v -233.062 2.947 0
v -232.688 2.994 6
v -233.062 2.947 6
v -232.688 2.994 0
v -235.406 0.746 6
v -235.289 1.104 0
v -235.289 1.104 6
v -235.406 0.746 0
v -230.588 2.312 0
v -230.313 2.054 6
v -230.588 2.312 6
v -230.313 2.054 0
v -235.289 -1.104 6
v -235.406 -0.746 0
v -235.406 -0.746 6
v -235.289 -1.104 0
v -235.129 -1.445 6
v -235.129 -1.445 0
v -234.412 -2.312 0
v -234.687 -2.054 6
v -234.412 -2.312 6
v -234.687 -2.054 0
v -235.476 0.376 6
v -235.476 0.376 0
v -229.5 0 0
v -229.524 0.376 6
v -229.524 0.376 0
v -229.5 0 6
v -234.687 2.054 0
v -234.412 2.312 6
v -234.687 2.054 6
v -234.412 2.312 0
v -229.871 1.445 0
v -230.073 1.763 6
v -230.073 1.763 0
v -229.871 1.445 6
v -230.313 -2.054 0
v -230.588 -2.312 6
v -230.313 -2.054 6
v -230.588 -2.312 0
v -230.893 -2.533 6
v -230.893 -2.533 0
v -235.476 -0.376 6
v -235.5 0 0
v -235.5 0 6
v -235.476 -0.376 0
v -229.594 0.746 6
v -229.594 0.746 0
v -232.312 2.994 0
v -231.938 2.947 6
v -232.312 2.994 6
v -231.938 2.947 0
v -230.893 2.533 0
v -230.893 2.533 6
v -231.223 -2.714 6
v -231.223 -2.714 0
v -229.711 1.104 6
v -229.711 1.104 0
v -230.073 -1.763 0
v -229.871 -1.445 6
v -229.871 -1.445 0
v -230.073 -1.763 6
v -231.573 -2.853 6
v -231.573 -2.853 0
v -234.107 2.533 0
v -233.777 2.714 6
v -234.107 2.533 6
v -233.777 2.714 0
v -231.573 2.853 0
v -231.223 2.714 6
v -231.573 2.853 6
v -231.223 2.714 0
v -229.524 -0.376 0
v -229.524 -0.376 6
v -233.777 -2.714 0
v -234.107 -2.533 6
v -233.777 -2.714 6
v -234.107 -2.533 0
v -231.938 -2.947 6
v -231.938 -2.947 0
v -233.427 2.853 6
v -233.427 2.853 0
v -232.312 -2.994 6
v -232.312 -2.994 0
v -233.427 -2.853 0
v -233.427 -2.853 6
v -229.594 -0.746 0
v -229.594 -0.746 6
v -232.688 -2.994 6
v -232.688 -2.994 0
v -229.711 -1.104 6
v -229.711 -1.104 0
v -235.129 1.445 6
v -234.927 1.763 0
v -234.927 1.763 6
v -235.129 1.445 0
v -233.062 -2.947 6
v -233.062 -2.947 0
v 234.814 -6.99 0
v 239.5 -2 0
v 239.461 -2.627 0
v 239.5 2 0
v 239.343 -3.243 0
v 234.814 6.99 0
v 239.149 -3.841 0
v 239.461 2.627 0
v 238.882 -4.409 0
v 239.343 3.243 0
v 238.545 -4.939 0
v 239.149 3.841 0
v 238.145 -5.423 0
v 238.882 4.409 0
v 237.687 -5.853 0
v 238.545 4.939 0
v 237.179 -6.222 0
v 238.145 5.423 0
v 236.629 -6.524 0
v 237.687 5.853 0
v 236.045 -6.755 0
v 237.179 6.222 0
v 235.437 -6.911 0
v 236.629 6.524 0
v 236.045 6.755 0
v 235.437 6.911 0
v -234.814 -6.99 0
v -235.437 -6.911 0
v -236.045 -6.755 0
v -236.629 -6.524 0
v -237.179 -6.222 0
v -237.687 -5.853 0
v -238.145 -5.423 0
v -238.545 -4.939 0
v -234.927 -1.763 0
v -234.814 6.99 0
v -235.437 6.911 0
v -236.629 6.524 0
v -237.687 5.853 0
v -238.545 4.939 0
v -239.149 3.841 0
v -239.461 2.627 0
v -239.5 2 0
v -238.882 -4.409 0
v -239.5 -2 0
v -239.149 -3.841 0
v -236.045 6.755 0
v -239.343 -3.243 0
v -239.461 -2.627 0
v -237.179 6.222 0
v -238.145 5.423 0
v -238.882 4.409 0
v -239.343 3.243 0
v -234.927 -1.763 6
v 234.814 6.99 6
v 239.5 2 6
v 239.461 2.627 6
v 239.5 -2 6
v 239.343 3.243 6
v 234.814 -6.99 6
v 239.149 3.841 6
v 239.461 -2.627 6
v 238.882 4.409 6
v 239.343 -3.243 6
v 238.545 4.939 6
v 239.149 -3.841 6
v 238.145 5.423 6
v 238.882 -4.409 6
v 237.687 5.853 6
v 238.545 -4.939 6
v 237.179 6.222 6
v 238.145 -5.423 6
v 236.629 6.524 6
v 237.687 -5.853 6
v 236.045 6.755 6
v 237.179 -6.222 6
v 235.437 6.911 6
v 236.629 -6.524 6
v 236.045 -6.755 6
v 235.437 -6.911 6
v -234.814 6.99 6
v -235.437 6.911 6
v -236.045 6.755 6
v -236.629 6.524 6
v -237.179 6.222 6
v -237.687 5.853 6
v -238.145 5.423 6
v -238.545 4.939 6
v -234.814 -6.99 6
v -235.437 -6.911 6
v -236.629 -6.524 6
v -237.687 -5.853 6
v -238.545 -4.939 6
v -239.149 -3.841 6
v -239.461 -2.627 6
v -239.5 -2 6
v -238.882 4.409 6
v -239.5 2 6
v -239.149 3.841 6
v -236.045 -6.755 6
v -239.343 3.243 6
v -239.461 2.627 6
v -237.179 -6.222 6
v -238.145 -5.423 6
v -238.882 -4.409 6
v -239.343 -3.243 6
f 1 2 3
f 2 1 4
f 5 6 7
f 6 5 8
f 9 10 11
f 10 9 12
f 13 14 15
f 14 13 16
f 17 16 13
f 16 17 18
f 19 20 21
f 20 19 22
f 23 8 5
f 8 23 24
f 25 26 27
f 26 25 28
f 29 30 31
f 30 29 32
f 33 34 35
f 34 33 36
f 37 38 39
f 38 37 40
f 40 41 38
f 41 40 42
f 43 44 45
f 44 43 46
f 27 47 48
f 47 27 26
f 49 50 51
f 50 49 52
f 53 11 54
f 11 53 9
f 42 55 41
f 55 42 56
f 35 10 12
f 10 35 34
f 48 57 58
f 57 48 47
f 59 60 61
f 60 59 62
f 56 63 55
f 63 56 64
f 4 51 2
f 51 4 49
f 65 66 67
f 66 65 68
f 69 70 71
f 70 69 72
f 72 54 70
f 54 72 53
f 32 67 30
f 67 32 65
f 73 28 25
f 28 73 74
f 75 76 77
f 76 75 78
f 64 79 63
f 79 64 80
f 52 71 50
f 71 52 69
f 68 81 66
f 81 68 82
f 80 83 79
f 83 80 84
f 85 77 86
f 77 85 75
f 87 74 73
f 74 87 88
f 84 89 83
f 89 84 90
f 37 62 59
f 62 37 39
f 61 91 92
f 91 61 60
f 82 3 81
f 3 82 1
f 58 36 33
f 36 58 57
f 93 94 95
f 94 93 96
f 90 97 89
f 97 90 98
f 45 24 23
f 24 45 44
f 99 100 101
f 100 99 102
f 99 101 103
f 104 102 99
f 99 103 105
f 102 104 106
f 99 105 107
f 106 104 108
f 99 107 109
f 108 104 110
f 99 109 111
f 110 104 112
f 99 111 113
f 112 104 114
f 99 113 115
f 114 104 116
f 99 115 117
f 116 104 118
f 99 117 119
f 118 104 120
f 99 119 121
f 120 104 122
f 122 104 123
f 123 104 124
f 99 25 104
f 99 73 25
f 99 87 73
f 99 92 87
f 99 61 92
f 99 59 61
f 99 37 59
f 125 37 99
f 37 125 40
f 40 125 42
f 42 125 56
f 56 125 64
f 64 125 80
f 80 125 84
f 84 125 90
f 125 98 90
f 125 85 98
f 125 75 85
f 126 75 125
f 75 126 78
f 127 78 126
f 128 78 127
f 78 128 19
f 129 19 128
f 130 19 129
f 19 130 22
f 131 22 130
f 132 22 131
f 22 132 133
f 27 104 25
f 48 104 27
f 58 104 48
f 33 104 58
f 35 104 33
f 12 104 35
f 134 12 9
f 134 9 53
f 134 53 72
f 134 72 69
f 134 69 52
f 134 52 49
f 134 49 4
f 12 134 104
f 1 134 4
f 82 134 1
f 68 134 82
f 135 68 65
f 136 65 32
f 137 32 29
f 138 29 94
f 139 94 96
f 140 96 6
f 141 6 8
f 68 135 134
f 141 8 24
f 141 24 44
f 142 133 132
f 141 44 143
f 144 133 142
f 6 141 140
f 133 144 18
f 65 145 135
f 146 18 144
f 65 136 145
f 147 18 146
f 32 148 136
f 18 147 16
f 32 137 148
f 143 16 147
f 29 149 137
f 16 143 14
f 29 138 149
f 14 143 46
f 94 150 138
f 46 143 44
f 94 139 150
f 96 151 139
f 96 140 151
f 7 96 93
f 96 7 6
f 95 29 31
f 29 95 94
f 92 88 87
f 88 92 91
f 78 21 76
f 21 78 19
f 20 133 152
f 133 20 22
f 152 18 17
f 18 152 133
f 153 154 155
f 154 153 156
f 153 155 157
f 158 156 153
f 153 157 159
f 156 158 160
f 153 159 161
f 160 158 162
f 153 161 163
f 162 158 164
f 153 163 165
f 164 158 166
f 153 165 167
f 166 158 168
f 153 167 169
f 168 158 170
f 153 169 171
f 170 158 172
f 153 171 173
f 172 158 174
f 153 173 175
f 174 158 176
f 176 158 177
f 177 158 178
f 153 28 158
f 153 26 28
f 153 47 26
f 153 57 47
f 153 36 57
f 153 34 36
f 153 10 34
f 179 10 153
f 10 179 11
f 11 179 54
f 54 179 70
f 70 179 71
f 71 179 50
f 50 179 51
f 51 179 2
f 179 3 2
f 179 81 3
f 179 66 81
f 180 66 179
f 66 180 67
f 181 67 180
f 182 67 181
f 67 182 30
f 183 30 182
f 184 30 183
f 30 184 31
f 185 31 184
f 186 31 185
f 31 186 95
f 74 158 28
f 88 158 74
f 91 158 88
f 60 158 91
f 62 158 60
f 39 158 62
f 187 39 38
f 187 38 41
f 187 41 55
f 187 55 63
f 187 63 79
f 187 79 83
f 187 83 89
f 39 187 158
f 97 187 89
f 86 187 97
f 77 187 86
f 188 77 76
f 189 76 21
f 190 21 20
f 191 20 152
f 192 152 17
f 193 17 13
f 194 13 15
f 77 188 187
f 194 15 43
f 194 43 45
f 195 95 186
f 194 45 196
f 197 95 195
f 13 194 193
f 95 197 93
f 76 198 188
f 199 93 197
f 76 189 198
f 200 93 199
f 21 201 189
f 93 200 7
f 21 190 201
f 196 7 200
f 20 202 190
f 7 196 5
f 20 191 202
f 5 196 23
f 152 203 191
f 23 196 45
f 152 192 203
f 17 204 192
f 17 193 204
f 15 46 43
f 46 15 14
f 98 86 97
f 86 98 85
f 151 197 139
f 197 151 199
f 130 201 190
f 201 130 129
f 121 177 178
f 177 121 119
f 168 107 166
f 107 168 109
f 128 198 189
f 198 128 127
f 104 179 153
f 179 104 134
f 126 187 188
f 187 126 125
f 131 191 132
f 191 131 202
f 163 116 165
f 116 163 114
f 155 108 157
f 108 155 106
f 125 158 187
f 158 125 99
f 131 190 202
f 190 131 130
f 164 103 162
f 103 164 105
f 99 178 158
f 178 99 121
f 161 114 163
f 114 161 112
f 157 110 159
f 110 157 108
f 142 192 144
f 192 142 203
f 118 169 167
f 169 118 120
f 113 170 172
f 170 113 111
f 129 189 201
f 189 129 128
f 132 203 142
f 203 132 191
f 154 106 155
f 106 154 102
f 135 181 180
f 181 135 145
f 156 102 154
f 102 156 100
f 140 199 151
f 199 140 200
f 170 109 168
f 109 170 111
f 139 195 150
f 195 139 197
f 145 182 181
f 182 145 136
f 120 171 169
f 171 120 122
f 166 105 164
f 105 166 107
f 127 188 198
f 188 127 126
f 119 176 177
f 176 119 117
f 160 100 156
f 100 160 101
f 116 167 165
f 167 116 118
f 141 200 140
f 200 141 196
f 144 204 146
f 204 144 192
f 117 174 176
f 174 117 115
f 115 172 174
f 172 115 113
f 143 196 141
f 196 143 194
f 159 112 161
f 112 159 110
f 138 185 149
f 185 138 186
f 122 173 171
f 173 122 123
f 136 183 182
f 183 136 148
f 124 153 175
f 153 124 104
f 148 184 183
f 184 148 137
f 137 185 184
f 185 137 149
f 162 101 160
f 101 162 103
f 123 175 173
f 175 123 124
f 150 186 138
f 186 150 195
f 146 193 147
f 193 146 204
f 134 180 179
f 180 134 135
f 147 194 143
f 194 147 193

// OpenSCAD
$fn = 50;


difference() {
	union() {
		hull() {
			translate(v = [-234.5000000000, 2.0000000000, 0]) {
				cylinder(h = 6, r = 5);
			}
			translate(v = [234.5000000000, 2.0000000000, 0]) {
				cylinder(h = 6, r = 5);
			}
			translate(v = [-234.5000000000, -2.0000000000, 0]) {
				cylinder(h = 6, r = 5);
			}
			translate(v = [234.5000000000, -2.0000000000, 0]) {
				cylinder(h = 6, r = 5);
			}
		}
	}
	union() {
		translate(v = [-232.5000000000, 0.0000000000, 0]) {
			cylinder(h = 6, r = 3.0000000000);
		}
		translate(v = [-232.5000000000, 0.0000000000, 0]) {
			cylinder(h = 6, r = 1.5000000000);
		}
		translate(v = [-232.5000000000, 0.0000000000, 0]) {
			cylinder(h = 6, r = 1.5000000000);
		}
		translate(v = [-232.5000000000, 0.0000000000, 0]) {
			cylinder(h = 6, r = 1.5000000000);
		}
	}
}
